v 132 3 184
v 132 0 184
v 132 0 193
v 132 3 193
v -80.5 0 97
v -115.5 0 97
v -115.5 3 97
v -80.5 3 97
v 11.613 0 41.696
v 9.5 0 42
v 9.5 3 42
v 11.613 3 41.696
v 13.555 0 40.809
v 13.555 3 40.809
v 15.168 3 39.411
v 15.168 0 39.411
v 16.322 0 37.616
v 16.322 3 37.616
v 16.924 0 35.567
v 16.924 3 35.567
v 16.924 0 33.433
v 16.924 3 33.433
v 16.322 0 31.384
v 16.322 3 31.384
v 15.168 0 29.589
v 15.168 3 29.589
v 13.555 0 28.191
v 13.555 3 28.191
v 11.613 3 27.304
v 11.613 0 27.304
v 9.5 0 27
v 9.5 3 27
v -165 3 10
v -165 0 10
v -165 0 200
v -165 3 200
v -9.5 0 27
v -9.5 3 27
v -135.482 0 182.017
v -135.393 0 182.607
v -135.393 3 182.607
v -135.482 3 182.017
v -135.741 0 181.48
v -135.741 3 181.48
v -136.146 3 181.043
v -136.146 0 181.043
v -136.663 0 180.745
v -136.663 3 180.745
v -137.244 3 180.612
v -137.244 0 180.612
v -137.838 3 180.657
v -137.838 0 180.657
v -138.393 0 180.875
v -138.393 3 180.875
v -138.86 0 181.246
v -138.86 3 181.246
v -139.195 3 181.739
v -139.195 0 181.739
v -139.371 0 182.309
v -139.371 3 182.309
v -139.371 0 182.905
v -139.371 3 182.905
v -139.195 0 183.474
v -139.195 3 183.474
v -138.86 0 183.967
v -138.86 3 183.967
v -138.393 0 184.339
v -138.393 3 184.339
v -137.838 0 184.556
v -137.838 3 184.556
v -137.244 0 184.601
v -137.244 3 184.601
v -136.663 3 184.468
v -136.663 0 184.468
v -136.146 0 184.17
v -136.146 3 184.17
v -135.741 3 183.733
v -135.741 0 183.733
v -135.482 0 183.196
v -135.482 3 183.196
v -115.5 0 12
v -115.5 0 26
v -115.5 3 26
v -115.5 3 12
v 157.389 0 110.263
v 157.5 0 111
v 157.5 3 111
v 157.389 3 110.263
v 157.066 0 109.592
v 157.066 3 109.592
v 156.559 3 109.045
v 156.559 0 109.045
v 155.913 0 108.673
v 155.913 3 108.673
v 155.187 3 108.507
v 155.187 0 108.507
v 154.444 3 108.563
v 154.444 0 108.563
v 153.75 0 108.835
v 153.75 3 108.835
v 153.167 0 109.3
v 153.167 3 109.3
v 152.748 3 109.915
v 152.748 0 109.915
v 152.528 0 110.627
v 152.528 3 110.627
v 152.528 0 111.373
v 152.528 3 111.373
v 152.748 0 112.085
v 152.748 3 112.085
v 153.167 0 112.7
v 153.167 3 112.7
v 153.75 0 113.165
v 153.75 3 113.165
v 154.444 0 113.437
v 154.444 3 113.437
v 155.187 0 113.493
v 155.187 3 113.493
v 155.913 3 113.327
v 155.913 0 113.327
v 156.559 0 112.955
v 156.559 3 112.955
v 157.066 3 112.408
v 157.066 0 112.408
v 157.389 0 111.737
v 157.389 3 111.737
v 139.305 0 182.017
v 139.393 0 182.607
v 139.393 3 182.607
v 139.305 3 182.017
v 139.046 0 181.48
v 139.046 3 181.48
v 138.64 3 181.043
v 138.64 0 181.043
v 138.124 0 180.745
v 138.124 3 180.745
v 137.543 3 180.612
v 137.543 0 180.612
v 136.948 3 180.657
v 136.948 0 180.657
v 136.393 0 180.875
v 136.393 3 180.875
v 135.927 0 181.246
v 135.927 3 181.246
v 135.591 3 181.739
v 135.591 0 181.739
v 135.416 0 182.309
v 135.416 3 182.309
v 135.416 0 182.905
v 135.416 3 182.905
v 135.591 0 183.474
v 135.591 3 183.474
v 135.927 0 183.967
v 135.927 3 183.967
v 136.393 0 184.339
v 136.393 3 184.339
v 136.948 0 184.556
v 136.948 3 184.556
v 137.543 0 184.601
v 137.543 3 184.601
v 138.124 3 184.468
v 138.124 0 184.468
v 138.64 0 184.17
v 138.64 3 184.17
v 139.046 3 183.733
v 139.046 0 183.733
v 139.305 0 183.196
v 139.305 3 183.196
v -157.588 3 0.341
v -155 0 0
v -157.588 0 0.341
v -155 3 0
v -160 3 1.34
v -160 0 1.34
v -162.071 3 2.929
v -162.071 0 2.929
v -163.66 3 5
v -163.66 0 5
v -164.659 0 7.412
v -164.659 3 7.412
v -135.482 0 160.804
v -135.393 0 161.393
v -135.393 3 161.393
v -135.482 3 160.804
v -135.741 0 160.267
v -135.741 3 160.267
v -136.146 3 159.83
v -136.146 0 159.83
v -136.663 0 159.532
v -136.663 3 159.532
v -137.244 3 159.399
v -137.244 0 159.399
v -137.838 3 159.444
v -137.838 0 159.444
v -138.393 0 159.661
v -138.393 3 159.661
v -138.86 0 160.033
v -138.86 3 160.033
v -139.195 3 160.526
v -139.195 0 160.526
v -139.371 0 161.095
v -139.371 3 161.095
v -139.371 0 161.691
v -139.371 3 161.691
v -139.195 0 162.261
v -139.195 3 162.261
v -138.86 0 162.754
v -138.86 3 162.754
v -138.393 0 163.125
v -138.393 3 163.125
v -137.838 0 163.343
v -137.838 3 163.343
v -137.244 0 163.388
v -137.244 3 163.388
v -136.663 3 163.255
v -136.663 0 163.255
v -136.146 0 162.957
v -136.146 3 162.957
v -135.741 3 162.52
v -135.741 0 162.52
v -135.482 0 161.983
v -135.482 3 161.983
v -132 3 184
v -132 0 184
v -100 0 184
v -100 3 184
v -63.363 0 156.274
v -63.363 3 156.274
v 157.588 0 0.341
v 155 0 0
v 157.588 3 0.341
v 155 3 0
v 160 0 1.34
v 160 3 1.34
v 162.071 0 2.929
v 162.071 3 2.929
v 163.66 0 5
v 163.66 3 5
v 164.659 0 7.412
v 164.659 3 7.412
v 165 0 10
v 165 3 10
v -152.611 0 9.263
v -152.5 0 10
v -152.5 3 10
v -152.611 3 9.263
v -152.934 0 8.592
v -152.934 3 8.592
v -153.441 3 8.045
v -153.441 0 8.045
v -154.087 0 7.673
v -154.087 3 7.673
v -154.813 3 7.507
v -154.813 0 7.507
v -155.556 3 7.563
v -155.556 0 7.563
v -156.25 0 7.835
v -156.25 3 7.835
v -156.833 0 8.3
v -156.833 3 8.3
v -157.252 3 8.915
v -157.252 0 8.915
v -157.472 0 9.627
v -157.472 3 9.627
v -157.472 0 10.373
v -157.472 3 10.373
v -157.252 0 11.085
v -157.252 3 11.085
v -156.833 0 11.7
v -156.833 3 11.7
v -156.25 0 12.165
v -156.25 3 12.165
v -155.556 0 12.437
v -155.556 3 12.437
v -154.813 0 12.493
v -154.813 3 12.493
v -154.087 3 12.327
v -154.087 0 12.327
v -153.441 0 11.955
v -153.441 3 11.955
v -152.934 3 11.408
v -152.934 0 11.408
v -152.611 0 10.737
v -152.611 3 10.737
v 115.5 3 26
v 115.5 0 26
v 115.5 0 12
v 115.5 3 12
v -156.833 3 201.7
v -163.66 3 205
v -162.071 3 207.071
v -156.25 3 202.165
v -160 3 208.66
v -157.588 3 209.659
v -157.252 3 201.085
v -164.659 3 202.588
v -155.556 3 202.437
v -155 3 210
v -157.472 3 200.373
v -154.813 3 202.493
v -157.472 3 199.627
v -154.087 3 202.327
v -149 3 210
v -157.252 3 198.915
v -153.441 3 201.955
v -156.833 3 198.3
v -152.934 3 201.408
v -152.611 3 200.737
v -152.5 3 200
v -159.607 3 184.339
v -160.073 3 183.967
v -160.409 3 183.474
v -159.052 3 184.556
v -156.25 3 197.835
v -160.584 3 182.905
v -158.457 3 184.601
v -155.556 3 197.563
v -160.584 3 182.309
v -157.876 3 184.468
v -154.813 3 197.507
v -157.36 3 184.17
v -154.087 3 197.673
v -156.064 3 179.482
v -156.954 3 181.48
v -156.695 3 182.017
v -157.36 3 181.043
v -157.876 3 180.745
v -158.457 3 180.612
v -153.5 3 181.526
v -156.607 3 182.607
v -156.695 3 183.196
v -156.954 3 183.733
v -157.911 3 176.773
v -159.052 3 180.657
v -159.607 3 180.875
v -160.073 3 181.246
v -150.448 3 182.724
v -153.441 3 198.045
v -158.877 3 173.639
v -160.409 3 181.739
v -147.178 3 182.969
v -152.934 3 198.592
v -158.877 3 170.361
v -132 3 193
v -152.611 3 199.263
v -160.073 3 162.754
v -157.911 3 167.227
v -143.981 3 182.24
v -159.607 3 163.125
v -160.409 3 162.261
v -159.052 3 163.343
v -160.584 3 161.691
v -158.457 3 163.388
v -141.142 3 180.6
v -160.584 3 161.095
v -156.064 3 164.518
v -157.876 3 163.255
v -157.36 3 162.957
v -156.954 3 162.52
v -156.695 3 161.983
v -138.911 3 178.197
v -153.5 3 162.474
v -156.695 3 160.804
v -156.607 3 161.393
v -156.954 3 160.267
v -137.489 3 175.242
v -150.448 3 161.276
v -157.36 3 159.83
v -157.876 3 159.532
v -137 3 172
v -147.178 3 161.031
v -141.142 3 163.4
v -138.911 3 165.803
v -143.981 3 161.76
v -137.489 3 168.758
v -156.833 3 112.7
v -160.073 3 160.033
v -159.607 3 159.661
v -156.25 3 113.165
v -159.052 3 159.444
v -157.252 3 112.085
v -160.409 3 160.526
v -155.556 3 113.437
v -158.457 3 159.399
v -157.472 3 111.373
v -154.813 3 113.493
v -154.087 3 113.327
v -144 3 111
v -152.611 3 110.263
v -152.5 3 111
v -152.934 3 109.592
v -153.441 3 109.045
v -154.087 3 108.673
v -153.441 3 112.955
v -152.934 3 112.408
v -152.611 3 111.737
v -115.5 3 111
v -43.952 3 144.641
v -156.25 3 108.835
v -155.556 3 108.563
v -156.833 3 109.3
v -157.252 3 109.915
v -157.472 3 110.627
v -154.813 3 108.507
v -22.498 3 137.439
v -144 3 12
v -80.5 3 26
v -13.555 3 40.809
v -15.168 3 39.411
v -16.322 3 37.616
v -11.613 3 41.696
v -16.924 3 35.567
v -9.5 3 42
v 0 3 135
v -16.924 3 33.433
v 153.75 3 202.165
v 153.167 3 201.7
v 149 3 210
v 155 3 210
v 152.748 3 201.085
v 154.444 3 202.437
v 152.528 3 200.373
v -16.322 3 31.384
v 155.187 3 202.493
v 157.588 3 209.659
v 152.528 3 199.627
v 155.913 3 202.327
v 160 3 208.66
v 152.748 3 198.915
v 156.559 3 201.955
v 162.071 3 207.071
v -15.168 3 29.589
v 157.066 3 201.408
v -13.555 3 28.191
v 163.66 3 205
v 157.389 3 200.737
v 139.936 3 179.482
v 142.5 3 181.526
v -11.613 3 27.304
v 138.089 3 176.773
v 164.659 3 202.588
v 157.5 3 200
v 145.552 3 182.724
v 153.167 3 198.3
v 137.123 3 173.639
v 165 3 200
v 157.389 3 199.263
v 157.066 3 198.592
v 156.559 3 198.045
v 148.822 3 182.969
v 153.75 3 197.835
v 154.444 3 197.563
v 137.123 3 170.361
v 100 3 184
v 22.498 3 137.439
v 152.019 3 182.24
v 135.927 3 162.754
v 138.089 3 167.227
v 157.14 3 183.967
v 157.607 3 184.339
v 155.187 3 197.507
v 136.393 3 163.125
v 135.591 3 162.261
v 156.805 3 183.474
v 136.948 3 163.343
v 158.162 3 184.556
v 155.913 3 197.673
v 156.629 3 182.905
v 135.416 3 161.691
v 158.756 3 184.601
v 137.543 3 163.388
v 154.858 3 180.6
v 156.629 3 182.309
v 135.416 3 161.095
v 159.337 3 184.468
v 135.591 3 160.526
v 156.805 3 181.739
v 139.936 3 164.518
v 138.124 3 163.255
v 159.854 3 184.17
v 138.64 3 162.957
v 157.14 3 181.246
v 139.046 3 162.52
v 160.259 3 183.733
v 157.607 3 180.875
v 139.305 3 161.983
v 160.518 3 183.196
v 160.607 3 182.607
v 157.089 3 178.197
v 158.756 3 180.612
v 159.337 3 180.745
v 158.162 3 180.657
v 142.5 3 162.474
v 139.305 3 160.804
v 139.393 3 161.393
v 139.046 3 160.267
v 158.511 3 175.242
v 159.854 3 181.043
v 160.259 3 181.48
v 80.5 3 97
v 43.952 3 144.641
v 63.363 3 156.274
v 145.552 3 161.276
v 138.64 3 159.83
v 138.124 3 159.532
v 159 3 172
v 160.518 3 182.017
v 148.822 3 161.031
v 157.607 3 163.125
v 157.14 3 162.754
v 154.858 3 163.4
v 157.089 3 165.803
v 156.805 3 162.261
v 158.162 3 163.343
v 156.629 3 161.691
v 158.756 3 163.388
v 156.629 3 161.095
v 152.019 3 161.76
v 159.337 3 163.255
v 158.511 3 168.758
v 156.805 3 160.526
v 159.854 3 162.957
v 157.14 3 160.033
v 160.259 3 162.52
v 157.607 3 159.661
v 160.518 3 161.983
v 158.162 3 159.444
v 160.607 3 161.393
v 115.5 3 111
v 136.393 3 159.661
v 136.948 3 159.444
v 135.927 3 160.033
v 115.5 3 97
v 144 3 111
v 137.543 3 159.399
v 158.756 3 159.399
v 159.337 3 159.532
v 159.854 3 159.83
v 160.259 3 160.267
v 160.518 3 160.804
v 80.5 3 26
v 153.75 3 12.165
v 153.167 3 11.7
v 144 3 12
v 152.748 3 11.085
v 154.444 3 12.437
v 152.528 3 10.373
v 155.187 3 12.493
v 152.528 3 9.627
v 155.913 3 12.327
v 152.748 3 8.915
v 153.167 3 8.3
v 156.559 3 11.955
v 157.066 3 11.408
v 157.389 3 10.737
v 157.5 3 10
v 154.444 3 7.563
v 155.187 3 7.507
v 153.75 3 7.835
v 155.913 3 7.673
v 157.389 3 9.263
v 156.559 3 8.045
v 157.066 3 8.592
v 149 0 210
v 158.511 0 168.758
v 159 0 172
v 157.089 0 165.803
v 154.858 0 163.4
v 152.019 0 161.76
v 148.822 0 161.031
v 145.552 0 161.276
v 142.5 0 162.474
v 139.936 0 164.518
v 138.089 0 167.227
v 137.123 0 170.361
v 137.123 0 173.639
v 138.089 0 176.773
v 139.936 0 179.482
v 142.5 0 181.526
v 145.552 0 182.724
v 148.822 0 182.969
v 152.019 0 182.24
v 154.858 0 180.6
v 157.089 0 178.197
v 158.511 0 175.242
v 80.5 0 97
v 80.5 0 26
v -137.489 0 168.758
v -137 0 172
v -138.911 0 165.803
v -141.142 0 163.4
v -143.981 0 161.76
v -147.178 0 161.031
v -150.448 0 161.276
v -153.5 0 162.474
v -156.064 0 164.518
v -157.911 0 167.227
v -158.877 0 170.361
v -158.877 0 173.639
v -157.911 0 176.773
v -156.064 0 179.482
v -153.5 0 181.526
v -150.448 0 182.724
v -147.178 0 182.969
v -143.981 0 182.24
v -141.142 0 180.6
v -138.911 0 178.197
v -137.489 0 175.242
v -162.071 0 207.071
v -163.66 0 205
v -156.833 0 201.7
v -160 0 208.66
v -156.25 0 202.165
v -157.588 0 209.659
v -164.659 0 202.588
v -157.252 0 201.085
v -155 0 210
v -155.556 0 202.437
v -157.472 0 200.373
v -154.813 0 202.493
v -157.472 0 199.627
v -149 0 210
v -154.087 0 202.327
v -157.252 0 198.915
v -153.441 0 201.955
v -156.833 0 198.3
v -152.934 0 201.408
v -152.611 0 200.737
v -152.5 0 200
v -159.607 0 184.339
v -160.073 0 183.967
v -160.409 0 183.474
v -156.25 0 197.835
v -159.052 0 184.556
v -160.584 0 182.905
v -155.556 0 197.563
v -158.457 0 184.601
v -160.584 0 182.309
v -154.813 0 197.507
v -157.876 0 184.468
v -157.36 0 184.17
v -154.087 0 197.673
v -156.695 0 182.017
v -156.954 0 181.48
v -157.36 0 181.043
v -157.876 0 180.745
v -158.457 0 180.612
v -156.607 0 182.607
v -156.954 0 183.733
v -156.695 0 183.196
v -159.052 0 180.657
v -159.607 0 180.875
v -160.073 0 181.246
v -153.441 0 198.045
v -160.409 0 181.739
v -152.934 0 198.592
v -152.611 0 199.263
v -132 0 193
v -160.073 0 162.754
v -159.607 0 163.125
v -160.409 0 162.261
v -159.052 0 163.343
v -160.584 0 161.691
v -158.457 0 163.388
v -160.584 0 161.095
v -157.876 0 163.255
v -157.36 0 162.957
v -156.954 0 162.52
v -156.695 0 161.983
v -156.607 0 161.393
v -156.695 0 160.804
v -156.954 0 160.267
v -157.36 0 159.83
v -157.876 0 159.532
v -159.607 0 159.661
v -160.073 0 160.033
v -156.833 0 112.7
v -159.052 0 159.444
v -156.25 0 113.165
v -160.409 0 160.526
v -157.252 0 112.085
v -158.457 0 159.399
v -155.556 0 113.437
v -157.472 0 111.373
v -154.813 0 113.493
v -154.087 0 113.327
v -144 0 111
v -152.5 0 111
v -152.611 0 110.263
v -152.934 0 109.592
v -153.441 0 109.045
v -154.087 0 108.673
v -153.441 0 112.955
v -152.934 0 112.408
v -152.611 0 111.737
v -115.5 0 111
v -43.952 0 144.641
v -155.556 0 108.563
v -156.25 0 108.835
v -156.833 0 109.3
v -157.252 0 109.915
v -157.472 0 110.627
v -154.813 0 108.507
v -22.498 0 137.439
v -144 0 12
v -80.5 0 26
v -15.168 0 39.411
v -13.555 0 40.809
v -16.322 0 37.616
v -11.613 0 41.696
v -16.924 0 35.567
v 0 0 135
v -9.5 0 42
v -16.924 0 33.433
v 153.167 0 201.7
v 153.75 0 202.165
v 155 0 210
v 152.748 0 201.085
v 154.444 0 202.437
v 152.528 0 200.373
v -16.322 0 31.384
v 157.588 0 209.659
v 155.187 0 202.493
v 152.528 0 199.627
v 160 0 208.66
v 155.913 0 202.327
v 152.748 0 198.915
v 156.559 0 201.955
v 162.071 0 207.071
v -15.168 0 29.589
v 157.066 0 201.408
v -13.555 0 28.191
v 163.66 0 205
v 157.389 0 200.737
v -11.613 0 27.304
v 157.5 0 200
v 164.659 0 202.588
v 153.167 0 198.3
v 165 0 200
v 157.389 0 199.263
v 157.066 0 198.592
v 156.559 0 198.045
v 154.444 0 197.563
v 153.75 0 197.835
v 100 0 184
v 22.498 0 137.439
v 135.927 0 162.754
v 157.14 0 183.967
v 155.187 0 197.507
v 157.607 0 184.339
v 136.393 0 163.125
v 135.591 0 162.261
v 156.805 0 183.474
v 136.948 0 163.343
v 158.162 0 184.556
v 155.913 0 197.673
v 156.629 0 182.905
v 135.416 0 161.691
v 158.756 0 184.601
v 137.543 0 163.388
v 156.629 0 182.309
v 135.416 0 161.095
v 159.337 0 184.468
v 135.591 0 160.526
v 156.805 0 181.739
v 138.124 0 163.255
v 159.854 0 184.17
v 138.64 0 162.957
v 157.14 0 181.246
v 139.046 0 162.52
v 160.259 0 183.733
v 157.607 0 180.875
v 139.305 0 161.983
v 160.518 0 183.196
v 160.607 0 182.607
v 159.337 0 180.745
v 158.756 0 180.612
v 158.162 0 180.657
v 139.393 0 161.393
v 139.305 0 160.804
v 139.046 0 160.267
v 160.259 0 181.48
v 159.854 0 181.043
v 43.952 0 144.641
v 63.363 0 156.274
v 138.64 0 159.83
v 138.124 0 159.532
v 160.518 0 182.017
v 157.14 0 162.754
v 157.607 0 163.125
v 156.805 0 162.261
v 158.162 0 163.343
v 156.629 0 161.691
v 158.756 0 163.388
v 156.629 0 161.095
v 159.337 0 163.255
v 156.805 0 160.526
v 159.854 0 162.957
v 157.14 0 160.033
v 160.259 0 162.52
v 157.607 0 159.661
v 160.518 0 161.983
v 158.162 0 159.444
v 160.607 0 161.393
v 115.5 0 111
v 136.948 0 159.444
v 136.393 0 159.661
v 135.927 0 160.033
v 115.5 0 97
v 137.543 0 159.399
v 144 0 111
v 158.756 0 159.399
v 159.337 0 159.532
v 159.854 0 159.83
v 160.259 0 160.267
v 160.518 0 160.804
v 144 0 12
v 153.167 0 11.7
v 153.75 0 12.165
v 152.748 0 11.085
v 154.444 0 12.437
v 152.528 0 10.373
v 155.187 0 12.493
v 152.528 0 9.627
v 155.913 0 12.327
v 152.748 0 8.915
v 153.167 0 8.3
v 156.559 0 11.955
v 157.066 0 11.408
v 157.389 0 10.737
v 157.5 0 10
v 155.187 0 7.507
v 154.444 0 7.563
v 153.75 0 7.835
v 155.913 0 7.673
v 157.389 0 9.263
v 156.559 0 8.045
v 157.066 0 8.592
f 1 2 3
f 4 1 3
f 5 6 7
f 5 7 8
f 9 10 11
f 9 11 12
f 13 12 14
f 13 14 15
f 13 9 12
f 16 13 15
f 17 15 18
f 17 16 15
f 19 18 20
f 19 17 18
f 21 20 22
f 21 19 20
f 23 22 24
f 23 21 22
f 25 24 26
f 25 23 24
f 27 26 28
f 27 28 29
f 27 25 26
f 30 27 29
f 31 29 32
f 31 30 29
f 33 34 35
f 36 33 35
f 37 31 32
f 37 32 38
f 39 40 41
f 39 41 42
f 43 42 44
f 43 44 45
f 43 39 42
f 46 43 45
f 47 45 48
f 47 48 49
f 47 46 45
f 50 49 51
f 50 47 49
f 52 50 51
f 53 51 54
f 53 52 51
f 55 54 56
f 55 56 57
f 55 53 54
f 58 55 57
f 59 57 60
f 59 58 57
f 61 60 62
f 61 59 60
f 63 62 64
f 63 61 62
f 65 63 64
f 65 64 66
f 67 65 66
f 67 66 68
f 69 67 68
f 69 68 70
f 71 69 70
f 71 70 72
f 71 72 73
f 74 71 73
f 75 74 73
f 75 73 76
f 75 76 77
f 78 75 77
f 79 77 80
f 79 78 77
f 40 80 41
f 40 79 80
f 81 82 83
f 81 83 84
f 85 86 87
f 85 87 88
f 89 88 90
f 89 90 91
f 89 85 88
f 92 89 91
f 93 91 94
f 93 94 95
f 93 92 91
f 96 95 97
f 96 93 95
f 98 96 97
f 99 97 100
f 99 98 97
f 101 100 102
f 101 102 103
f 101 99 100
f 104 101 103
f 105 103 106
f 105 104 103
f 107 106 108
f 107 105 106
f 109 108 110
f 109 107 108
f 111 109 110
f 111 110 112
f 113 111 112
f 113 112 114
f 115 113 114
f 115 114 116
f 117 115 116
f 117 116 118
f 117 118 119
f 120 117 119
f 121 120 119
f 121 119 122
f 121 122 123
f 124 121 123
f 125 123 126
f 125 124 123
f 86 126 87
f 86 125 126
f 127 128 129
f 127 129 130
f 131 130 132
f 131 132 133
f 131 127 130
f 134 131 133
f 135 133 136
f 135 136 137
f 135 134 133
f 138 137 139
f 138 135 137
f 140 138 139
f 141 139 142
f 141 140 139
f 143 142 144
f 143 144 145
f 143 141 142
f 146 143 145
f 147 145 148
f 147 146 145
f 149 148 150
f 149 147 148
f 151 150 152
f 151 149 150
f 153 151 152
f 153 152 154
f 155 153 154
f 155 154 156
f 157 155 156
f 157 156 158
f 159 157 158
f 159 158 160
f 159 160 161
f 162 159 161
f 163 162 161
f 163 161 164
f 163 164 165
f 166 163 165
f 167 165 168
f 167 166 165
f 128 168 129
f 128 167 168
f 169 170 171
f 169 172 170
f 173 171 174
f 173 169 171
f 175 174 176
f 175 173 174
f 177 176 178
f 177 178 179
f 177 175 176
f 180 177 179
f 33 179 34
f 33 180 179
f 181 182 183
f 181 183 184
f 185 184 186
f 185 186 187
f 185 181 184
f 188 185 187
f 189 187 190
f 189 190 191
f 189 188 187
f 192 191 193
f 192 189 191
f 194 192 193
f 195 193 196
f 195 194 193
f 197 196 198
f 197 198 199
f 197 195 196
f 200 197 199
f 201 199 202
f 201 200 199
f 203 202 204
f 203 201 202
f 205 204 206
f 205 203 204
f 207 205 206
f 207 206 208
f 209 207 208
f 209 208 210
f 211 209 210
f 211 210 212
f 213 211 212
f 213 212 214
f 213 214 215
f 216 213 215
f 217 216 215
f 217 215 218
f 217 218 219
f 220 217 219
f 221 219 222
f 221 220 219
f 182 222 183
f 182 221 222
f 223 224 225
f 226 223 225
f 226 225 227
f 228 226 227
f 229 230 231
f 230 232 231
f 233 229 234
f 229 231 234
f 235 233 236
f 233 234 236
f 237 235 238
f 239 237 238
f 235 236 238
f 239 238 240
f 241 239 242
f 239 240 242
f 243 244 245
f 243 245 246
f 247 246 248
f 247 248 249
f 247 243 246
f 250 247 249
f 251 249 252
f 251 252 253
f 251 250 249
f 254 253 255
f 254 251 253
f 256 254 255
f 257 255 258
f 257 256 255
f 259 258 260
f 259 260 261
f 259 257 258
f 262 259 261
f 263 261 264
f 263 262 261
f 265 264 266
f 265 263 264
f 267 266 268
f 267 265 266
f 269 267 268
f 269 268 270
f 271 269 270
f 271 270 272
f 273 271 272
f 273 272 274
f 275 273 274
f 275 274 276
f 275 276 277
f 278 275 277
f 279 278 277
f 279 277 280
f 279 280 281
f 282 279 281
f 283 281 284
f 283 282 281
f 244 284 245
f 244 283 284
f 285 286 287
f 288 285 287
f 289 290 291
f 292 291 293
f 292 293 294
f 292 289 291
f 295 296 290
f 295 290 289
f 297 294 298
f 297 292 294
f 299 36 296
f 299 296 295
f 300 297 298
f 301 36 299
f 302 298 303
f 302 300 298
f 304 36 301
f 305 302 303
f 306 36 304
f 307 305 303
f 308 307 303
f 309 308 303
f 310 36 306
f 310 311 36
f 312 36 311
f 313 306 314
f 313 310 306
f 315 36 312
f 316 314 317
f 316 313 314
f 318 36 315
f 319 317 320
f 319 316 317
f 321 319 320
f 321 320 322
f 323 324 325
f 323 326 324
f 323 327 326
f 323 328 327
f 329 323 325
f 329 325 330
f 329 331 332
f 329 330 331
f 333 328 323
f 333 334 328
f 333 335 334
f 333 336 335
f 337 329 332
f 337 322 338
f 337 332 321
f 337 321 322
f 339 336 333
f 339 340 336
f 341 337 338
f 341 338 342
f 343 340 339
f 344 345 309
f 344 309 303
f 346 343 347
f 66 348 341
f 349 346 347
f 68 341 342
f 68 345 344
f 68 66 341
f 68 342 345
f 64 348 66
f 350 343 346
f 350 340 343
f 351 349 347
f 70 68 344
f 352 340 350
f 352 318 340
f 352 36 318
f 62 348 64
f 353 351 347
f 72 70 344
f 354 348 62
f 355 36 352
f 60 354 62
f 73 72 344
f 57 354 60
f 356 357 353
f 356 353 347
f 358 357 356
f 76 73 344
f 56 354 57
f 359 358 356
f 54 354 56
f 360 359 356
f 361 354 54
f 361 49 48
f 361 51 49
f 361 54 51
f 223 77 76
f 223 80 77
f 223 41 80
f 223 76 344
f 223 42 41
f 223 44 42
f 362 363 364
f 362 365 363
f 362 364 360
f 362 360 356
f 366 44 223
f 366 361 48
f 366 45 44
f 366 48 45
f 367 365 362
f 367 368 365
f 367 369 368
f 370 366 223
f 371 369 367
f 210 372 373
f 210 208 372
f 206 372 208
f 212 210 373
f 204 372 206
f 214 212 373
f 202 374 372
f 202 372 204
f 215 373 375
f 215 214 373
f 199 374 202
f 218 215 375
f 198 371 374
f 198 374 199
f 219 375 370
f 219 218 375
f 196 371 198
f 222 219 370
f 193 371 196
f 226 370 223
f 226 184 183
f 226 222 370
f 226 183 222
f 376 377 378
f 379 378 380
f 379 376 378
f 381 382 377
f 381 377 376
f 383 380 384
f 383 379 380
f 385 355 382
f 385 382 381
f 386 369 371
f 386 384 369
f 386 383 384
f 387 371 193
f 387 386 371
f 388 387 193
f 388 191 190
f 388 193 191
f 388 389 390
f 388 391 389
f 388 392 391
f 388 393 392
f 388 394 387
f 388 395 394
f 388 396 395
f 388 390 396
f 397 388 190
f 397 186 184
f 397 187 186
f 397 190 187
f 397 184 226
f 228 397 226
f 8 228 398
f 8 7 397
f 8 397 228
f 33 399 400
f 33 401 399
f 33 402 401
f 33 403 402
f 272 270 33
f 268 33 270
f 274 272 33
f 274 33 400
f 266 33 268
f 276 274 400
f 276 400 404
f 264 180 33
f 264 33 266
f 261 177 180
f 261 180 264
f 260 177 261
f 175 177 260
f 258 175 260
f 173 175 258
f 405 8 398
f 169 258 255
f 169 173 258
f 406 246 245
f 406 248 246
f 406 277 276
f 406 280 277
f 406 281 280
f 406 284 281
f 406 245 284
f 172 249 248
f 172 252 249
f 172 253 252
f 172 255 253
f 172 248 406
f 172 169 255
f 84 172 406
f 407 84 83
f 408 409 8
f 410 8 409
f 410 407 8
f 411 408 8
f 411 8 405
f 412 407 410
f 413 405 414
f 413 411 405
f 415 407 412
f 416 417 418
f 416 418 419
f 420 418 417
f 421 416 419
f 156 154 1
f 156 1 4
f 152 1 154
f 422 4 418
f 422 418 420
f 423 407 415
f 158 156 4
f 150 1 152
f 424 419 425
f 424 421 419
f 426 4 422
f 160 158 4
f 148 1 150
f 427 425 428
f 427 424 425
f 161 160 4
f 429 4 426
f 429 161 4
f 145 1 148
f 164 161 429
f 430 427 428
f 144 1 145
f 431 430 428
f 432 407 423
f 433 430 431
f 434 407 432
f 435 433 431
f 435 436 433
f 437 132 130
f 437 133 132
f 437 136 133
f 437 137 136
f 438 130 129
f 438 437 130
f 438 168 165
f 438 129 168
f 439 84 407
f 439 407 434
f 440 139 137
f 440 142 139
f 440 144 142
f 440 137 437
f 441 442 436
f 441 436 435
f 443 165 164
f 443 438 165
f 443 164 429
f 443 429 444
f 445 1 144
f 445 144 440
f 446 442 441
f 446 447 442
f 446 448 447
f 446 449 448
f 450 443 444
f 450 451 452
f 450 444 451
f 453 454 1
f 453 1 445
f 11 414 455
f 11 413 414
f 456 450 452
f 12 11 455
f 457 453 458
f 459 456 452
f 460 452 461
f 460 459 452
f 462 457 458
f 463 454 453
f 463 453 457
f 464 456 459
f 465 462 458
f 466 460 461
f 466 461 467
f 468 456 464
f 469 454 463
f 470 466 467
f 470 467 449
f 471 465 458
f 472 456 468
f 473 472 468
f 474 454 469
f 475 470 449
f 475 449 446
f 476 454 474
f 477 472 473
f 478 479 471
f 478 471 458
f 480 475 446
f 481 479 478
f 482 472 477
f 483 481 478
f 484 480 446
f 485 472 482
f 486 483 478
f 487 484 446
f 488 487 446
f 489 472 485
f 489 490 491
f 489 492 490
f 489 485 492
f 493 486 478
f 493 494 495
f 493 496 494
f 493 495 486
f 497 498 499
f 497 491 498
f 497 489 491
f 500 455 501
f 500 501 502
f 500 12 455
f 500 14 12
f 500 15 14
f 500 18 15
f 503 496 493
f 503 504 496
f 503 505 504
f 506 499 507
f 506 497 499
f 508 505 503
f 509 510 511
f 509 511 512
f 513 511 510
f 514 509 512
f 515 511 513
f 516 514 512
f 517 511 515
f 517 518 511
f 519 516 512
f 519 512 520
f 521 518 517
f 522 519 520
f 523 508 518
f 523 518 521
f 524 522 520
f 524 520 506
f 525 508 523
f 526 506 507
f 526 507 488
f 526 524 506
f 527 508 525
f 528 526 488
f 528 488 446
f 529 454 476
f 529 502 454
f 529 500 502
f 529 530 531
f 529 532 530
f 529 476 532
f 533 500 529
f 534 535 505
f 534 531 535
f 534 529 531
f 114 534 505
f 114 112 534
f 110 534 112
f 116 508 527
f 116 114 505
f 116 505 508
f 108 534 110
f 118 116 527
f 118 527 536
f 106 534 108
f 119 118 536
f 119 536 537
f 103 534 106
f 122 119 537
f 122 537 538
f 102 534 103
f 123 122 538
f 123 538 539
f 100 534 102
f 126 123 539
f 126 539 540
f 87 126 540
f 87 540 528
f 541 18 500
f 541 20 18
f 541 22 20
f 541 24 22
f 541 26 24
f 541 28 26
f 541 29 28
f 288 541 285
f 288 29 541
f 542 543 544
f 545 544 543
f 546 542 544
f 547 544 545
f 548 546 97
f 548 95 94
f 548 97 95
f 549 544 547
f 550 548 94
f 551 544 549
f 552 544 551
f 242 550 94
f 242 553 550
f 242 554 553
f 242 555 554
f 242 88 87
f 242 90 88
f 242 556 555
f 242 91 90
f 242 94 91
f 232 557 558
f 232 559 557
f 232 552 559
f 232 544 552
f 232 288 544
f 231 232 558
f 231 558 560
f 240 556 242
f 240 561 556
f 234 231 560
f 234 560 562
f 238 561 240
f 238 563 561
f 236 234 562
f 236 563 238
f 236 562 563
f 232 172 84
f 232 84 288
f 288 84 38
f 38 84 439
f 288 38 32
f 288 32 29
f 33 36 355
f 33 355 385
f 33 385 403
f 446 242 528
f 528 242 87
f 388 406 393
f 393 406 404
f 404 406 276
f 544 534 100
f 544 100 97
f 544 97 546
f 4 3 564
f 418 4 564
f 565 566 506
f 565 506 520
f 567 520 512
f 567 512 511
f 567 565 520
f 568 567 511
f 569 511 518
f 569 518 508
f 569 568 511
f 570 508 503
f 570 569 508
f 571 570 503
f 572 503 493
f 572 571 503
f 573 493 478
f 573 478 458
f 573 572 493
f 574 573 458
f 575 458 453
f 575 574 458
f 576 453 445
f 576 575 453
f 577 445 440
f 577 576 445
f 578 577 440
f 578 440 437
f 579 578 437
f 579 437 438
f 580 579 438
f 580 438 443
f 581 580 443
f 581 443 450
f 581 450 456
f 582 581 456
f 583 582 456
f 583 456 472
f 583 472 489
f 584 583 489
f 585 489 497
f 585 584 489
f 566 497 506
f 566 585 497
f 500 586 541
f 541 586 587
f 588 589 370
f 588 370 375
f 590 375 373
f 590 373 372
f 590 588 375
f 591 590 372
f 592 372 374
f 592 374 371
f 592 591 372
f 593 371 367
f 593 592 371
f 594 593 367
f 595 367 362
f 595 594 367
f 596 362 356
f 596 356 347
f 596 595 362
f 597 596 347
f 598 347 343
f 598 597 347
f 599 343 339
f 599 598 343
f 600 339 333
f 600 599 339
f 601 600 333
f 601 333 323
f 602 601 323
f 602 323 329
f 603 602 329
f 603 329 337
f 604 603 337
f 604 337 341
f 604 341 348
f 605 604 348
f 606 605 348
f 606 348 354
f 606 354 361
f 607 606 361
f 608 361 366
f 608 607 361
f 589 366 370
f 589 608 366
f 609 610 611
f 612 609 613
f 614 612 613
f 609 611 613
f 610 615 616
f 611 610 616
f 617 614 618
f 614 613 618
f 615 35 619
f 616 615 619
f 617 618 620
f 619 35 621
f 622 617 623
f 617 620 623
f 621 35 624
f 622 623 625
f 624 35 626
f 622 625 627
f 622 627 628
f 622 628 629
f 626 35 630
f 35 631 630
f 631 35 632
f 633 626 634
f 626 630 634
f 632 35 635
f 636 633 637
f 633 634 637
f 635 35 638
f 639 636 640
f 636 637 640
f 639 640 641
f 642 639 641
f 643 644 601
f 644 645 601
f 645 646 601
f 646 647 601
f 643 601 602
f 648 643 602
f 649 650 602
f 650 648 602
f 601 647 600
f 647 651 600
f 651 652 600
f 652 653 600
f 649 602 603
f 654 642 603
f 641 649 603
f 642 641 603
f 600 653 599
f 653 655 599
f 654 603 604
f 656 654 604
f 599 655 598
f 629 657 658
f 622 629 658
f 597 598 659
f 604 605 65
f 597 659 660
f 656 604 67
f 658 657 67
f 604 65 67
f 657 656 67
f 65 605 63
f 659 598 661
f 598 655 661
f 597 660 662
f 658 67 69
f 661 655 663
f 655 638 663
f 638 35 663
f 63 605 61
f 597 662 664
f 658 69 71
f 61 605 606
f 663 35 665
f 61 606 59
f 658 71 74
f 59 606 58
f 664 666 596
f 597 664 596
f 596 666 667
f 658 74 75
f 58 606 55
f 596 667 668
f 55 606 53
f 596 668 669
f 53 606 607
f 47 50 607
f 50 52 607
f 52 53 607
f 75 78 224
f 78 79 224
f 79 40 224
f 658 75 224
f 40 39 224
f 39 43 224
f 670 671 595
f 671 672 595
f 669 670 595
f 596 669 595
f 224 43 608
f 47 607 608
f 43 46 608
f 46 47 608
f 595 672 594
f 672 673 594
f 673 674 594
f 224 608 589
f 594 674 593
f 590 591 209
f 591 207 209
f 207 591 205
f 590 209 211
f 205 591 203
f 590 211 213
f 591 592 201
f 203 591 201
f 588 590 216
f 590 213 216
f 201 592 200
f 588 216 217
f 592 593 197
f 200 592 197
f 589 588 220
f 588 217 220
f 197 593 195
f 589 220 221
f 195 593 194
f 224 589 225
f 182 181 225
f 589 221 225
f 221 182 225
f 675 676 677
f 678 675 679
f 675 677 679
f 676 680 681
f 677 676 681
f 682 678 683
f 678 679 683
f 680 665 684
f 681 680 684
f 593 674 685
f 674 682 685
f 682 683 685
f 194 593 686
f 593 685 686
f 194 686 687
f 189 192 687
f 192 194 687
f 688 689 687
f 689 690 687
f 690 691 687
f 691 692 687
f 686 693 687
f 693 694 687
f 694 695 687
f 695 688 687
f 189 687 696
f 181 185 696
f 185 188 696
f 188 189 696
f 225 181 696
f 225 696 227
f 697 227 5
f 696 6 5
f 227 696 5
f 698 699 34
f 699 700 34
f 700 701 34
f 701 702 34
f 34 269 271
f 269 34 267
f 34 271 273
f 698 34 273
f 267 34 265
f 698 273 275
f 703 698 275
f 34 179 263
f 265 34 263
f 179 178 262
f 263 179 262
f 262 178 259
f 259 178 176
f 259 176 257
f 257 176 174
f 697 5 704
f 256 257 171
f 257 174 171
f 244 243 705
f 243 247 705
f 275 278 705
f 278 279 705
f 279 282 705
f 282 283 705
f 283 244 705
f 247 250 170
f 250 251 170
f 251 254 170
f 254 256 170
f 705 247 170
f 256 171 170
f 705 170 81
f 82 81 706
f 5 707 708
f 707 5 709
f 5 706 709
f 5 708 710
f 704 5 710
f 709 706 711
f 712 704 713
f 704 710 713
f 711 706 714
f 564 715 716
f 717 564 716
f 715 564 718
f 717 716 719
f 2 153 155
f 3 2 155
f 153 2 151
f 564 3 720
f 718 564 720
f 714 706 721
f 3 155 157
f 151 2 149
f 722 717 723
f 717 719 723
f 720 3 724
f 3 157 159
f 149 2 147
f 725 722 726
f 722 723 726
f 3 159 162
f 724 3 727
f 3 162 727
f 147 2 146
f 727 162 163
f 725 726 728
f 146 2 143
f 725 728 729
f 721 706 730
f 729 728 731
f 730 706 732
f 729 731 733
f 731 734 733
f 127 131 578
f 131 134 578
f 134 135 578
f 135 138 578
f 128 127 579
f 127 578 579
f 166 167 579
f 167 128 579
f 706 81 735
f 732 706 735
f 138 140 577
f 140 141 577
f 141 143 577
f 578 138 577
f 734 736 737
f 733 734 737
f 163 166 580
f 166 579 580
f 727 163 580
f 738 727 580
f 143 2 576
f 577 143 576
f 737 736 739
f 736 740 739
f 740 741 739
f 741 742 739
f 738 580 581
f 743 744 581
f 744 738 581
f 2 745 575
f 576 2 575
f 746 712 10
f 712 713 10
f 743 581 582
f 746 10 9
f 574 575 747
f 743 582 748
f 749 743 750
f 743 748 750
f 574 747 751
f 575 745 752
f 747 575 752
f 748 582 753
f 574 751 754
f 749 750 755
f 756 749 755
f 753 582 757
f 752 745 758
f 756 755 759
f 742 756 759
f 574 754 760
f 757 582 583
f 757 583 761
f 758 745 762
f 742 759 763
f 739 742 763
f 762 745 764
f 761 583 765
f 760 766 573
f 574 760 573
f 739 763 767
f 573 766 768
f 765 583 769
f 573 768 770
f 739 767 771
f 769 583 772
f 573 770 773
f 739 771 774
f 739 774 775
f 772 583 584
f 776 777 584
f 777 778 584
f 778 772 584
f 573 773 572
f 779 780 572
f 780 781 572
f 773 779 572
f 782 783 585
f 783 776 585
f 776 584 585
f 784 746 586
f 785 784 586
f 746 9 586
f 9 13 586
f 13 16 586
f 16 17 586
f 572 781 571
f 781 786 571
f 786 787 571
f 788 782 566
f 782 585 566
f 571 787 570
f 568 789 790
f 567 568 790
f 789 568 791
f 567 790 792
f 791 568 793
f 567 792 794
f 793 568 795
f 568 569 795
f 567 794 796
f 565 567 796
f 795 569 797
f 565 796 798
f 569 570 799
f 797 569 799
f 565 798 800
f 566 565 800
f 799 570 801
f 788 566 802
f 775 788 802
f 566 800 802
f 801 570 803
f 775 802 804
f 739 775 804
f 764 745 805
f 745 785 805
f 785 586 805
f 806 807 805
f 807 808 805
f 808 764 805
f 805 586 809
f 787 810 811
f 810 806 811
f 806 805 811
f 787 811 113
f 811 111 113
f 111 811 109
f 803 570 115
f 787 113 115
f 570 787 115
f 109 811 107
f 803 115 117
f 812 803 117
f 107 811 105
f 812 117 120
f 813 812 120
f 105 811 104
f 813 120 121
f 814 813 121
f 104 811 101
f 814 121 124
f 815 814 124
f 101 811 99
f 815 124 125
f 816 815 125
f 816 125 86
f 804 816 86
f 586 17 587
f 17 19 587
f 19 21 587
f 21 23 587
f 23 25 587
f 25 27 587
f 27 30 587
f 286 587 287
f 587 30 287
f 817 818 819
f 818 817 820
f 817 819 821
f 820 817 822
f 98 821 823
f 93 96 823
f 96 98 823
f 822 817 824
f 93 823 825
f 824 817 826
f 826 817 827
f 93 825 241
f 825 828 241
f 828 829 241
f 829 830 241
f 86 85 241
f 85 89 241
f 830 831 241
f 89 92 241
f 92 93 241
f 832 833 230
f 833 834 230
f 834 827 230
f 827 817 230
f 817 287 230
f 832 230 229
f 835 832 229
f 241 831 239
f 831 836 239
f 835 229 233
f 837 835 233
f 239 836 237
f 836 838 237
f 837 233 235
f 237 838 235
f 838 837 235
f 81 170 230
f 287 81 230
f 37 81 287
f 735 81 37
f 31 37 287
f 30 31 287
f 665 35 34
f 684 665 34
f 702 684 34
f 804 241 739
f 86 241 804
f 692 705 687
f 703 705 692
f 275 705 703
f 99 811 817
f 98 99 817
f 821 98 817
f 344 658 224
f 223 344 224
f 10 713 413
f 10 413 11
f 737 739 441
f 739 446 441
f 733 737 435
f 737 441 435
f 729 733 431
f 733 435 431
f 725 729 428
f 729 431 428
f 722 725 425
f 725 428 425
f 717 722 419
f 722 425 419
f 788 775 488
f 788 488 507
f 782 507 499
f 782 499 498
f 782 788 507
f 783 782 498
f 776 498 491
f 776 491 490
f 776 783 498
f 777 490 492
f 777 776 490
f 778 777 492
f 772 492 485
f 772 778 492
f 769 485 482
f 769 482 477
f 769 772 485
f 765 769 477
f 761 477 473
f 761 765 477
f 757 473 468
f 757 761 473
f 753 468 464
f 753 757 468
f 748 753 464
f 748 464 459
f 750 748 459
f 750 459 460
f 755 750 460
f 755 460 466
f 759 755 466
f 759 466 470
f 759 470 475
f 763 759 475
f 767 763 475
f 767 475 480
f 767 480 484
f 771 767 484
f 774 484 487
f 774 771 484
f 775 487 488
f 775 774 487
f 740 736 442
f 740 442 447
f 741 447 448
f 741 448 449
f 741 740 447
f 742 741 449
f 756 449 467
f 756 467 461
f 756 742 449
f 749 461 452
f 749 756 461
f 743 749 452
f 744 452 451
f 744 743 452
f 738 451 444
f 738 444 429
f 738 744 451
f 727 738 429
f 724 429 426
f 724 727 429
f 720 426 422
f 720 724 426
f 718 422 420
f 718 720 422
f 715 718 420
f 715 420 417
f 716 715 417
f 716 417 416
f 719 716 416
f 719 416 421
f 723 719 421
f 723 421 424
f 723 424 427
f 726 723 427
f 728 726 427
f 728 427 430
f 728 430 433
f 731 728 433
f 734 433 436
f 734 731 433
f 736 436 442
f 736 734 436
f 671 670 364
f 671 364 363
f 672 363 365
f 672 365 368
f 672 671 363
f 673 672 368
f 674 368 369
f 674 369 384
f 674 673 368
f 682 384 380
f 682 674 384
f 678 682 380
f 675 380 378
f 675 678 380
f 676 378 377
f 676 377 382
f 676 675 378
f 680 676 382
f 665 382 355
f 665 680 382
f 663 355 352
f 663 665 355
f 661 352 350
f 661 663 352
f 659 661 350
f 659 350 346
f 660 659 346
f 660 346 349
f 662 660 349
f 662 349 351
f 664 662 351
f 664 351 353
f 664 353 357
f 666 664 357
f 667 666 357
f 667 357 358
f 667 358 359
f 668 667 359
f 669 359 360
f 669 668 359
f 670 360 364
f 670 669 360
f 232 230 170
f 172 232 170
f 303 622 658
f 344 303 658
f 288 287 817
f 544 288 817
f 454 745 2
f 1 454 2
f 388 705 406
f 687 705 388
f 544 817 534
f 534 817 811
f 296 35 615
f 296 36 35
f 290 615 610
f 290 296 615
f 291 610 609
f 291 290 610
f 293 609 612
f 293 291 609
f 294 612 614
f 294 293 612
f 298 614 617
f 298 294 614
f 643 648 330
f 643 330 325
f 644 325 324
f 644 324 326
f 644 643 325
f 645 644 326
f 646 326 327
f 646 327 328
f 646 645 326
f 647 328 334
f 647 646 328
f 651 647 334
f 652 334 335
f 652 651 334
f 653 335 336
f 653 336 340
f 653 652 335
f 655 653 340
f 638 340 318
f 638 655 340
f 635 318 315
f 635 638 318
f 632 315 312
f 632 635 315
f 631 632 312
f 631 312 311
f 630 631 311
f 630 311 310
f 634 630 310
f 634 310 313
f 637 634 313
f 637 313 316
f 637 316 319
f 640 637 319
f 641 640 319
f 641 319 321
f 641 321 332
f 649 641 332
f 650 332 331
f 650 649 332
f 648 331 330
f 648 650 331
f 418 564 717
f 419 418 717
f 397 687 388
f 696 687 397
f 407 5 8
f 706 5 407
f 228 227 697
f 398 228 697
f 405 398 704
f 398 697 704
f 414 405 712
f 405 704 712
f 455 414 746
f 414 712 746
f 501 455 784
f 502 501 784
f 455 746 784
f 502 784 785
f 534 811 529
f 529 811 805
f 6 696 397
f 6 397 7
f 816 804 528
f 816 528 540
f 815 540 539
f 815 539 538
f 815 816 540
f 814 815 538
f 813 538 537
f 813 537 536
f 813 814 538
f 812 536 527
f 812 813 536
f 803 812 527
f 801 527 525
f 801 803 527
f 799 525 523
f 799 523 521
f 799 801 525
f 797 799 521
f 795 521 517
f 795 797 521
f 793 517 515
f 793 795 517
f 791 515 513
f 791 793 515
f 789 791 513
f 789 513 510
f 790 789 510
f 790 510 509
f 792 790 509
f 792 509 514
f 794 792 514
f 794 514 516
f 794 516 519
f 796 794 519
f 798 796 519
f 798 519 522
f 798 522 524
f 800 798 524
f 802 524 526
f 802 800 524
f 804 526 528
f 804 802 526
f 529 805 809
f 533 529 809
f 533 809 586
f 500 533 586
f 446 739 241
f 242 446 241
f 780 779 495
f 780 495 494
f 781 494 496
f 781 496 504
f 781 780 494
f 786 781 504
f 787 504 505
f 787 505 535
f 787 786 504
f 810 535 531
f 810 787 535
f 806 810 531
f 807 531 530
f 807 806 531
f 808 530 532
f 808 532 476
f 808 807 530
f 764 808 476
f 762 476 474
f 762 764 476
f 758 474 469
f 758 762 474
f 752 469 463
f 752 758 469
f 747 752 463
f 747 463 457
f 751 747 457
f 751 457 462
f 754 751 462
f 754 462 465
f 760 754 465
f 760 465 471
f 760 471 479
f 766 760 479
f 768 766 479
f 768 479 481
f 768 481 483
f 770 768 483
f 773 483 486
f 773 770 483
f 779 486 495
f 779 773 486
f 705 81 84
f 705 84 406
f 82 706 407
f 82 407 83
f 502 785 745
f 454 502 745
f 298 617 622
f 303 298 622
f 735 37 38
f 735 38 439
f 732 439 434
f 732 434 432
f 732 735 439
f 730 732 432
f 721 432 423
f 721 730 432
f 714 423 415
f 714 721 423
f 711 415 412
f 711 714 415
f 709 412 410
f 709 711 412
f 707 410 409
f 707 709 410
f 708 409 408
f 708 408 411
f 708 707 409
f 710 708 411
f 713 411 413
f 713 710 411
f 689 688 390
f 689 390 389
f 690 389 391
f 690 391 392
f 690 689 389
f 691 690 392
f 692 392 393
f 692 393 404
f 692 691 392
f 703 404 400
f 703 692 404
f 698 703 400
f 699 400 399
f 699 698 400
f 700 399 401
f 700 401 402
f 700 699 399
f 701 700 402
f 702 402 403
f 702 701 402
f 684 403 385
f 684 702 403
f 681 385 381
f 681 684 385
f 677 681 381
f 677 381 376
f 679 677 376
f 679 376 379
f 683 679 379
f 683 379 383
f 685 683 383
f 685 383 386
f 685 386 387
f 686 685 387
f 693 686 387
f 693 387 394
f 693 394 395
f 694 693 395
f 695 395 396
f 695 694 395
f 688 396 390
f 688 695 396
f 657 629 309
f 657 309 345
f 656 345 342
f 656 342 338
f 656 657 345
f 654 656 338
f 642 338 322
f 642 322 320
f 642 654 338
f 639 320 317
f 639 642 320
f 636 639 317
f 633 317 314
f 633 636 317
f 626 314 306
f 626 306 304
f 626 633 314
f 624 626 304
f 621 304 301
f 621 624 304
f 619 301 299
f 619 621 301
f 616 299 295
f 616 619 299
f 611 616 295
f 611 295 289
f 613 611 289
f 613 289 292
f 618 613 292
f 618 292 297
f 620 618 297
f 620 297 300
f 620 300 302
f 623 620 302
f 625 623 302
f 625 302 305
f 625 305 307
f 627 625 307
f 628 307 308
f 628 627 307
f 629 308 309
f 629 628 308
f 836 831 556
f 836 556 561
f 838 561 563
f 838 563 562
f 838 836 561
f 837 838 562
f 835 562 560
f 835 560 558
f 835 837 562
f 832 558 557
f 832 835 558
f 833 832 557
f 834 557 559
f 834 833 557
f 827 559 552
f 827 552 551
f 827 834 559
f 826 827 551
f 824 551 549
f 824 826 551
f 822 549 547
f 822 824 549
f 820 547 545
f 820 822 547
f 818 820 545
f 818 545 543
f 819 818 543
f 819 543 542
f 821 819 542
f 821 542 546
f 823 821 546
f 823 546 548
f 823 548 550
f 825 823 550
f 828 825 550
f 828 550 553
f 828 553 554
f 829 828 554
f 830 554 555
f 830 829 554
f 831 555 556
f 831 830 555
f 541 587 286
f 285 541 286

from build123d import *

# Parameters (mm, degrees)
ESQUISSE1_R      = 2.5
ESQUISSE1_R_2    = 11
ESQUISSE1_R_3    = 2
EXTRUSION1_DEPTH = 3
CONG_1_R         = 10


with BuildPart() as part:
    # Esquisse1 → Extrusion1 (new body)
    with BuildSketch(Plane(origin=(0, 0, 0), x_dir=(1, 0, 0), z_dir=(0, 1, 0))):
        with BuildLine():
            Line((165, 0), (-165, 0))
            Line((-165, 0), (-165, -210))
            Line((-165, -210), (-149, -210))
            Line((-149, -210), (-132, -193))
            Line((-132, -193), (-132, -184))
            Line((-132, -184), (-100, -184))
            Line((-100, -184), (-63.363257782, -156.27367461))
            ThreePointArc((-63.363257782, -156.27367461), (0, -135), (63.363257782, -156.27367461))
            Line((63.363257782, -156.27367461), (100, -184))
            Line((100, -184), (132, -184))
            Line((132, -184), (132, -193))
            Line((132, -193), (149, -210))
            Line((149, -210), (165, -210))
            Line((165, -210), (165, 0))
        make_face()
        with Locations((-155, -10)):
            Circle(ESQUISSE1_R, mode=Mode.SUBTRACT)
        with Locations((155, -10)):
            Circle(ESQUISSE1_R, mode=Mode.SUBTRACT)
        with Locations((-155, -200)):
            Circle(ESQUISSE1_R, mode=Mode.SUBTRACT)
        with Locations((155, -200)):
            Circle(ESQUISSE1_R, mode=Mode.SUBTRACT)
        with Locations((-148, -172)):
            Circle(ESQUISSE1_R_2, mode=Mode.SUBTRACT)
        with Locations((-158.606601718, -161.393398282)):
            Circle(ESQUISSE1_R_3, mode=Mode.SUBTRACT)
        with Locations((-137.393398282, -161.393398282)):
            Circle(ESQUISSE1_R_3, mode=Mode.SUBTRACT)
        with Locations((-137.393398282, -182.606601718)):
            Circle(ESQUISSE1_R_3, mode=Mode.SUBTRACT)
        with Locations((-158.606601718, -182.606601718)):
            Circle(ESQUISSE1_R_3, mode=Mode.SUBTRACT)
        with Locations((148, -172)):
            Circle(ESQUISSE1_R_2, mode=Mode.SUBTRACT)
        with Locations((158.606601718, -182.606601718)):
            Circle(ESQUISSE1_R_3, mode=Mode.SUBTRACT)
        with Locations((137.393398282, -182.606601718)):
            Circle(ESQUISSE1_R_3, mode=Mode.SUBTRACT)
        with Locations((137.393398282, -161.393398282)):
            Circle(ESQUISSE1_R_3, mode=Mode.SUBTRACT)
        with Locations((158.606601718, -161.393398282)):
            Circle(ESQUISSE1_R_3, mode=Mode.SUBTRACT)
        with Locations((-155, -111)):
            Circle(ESQUISSE1_R, mode=Mode.SUBTRACT)
        with Locations((155, -111)):
            Circle(ESQUISSE1_R, mode=Mode.SUBTRACT)
        Polygon((-80.5, -26), (-115.5, -26), (-115.5, -12), (-144, -12), (-144, -111), (-115.5, -111), (-115.5, -97), (-80.5, -97), align=None, mode=Mode.SUBTRACT)
        Polygon((115.5, -26), (115.5, -12), (144, -12), (144, -111), (115.5, -111), (115.5, -97), (80.5, -97), (80.5, -26), align=None, mode=Mode.SUBTRACT)
        with BuildLine():
            Line((9.5, -27), (-9.5, -27))
            ThreePointArc((-9.5, -27), (-17, -34.5), (-9.5, -42))
            Line((-9.5, -42), (9.5, -42))
            ThreePointArc((9.5, -42), (17, -34.5), (9.5, -27))
        make_face(mode=Mode.SUBTRACT)
    extrude(amount=EXTRUSION1_DEPTH)

    # Congé1
    cong_1_edges = [part.edges().sort_by_distance(p)[0] for p in [
        (-165, 1.5, 0),
        (165, 1.5, 0),
        (165, 1.5, 210),
        (-165, 1.5, 210),
    ]]
    fillet(cong_1_edges, radius=CONG_1_R)


solid = part.part
